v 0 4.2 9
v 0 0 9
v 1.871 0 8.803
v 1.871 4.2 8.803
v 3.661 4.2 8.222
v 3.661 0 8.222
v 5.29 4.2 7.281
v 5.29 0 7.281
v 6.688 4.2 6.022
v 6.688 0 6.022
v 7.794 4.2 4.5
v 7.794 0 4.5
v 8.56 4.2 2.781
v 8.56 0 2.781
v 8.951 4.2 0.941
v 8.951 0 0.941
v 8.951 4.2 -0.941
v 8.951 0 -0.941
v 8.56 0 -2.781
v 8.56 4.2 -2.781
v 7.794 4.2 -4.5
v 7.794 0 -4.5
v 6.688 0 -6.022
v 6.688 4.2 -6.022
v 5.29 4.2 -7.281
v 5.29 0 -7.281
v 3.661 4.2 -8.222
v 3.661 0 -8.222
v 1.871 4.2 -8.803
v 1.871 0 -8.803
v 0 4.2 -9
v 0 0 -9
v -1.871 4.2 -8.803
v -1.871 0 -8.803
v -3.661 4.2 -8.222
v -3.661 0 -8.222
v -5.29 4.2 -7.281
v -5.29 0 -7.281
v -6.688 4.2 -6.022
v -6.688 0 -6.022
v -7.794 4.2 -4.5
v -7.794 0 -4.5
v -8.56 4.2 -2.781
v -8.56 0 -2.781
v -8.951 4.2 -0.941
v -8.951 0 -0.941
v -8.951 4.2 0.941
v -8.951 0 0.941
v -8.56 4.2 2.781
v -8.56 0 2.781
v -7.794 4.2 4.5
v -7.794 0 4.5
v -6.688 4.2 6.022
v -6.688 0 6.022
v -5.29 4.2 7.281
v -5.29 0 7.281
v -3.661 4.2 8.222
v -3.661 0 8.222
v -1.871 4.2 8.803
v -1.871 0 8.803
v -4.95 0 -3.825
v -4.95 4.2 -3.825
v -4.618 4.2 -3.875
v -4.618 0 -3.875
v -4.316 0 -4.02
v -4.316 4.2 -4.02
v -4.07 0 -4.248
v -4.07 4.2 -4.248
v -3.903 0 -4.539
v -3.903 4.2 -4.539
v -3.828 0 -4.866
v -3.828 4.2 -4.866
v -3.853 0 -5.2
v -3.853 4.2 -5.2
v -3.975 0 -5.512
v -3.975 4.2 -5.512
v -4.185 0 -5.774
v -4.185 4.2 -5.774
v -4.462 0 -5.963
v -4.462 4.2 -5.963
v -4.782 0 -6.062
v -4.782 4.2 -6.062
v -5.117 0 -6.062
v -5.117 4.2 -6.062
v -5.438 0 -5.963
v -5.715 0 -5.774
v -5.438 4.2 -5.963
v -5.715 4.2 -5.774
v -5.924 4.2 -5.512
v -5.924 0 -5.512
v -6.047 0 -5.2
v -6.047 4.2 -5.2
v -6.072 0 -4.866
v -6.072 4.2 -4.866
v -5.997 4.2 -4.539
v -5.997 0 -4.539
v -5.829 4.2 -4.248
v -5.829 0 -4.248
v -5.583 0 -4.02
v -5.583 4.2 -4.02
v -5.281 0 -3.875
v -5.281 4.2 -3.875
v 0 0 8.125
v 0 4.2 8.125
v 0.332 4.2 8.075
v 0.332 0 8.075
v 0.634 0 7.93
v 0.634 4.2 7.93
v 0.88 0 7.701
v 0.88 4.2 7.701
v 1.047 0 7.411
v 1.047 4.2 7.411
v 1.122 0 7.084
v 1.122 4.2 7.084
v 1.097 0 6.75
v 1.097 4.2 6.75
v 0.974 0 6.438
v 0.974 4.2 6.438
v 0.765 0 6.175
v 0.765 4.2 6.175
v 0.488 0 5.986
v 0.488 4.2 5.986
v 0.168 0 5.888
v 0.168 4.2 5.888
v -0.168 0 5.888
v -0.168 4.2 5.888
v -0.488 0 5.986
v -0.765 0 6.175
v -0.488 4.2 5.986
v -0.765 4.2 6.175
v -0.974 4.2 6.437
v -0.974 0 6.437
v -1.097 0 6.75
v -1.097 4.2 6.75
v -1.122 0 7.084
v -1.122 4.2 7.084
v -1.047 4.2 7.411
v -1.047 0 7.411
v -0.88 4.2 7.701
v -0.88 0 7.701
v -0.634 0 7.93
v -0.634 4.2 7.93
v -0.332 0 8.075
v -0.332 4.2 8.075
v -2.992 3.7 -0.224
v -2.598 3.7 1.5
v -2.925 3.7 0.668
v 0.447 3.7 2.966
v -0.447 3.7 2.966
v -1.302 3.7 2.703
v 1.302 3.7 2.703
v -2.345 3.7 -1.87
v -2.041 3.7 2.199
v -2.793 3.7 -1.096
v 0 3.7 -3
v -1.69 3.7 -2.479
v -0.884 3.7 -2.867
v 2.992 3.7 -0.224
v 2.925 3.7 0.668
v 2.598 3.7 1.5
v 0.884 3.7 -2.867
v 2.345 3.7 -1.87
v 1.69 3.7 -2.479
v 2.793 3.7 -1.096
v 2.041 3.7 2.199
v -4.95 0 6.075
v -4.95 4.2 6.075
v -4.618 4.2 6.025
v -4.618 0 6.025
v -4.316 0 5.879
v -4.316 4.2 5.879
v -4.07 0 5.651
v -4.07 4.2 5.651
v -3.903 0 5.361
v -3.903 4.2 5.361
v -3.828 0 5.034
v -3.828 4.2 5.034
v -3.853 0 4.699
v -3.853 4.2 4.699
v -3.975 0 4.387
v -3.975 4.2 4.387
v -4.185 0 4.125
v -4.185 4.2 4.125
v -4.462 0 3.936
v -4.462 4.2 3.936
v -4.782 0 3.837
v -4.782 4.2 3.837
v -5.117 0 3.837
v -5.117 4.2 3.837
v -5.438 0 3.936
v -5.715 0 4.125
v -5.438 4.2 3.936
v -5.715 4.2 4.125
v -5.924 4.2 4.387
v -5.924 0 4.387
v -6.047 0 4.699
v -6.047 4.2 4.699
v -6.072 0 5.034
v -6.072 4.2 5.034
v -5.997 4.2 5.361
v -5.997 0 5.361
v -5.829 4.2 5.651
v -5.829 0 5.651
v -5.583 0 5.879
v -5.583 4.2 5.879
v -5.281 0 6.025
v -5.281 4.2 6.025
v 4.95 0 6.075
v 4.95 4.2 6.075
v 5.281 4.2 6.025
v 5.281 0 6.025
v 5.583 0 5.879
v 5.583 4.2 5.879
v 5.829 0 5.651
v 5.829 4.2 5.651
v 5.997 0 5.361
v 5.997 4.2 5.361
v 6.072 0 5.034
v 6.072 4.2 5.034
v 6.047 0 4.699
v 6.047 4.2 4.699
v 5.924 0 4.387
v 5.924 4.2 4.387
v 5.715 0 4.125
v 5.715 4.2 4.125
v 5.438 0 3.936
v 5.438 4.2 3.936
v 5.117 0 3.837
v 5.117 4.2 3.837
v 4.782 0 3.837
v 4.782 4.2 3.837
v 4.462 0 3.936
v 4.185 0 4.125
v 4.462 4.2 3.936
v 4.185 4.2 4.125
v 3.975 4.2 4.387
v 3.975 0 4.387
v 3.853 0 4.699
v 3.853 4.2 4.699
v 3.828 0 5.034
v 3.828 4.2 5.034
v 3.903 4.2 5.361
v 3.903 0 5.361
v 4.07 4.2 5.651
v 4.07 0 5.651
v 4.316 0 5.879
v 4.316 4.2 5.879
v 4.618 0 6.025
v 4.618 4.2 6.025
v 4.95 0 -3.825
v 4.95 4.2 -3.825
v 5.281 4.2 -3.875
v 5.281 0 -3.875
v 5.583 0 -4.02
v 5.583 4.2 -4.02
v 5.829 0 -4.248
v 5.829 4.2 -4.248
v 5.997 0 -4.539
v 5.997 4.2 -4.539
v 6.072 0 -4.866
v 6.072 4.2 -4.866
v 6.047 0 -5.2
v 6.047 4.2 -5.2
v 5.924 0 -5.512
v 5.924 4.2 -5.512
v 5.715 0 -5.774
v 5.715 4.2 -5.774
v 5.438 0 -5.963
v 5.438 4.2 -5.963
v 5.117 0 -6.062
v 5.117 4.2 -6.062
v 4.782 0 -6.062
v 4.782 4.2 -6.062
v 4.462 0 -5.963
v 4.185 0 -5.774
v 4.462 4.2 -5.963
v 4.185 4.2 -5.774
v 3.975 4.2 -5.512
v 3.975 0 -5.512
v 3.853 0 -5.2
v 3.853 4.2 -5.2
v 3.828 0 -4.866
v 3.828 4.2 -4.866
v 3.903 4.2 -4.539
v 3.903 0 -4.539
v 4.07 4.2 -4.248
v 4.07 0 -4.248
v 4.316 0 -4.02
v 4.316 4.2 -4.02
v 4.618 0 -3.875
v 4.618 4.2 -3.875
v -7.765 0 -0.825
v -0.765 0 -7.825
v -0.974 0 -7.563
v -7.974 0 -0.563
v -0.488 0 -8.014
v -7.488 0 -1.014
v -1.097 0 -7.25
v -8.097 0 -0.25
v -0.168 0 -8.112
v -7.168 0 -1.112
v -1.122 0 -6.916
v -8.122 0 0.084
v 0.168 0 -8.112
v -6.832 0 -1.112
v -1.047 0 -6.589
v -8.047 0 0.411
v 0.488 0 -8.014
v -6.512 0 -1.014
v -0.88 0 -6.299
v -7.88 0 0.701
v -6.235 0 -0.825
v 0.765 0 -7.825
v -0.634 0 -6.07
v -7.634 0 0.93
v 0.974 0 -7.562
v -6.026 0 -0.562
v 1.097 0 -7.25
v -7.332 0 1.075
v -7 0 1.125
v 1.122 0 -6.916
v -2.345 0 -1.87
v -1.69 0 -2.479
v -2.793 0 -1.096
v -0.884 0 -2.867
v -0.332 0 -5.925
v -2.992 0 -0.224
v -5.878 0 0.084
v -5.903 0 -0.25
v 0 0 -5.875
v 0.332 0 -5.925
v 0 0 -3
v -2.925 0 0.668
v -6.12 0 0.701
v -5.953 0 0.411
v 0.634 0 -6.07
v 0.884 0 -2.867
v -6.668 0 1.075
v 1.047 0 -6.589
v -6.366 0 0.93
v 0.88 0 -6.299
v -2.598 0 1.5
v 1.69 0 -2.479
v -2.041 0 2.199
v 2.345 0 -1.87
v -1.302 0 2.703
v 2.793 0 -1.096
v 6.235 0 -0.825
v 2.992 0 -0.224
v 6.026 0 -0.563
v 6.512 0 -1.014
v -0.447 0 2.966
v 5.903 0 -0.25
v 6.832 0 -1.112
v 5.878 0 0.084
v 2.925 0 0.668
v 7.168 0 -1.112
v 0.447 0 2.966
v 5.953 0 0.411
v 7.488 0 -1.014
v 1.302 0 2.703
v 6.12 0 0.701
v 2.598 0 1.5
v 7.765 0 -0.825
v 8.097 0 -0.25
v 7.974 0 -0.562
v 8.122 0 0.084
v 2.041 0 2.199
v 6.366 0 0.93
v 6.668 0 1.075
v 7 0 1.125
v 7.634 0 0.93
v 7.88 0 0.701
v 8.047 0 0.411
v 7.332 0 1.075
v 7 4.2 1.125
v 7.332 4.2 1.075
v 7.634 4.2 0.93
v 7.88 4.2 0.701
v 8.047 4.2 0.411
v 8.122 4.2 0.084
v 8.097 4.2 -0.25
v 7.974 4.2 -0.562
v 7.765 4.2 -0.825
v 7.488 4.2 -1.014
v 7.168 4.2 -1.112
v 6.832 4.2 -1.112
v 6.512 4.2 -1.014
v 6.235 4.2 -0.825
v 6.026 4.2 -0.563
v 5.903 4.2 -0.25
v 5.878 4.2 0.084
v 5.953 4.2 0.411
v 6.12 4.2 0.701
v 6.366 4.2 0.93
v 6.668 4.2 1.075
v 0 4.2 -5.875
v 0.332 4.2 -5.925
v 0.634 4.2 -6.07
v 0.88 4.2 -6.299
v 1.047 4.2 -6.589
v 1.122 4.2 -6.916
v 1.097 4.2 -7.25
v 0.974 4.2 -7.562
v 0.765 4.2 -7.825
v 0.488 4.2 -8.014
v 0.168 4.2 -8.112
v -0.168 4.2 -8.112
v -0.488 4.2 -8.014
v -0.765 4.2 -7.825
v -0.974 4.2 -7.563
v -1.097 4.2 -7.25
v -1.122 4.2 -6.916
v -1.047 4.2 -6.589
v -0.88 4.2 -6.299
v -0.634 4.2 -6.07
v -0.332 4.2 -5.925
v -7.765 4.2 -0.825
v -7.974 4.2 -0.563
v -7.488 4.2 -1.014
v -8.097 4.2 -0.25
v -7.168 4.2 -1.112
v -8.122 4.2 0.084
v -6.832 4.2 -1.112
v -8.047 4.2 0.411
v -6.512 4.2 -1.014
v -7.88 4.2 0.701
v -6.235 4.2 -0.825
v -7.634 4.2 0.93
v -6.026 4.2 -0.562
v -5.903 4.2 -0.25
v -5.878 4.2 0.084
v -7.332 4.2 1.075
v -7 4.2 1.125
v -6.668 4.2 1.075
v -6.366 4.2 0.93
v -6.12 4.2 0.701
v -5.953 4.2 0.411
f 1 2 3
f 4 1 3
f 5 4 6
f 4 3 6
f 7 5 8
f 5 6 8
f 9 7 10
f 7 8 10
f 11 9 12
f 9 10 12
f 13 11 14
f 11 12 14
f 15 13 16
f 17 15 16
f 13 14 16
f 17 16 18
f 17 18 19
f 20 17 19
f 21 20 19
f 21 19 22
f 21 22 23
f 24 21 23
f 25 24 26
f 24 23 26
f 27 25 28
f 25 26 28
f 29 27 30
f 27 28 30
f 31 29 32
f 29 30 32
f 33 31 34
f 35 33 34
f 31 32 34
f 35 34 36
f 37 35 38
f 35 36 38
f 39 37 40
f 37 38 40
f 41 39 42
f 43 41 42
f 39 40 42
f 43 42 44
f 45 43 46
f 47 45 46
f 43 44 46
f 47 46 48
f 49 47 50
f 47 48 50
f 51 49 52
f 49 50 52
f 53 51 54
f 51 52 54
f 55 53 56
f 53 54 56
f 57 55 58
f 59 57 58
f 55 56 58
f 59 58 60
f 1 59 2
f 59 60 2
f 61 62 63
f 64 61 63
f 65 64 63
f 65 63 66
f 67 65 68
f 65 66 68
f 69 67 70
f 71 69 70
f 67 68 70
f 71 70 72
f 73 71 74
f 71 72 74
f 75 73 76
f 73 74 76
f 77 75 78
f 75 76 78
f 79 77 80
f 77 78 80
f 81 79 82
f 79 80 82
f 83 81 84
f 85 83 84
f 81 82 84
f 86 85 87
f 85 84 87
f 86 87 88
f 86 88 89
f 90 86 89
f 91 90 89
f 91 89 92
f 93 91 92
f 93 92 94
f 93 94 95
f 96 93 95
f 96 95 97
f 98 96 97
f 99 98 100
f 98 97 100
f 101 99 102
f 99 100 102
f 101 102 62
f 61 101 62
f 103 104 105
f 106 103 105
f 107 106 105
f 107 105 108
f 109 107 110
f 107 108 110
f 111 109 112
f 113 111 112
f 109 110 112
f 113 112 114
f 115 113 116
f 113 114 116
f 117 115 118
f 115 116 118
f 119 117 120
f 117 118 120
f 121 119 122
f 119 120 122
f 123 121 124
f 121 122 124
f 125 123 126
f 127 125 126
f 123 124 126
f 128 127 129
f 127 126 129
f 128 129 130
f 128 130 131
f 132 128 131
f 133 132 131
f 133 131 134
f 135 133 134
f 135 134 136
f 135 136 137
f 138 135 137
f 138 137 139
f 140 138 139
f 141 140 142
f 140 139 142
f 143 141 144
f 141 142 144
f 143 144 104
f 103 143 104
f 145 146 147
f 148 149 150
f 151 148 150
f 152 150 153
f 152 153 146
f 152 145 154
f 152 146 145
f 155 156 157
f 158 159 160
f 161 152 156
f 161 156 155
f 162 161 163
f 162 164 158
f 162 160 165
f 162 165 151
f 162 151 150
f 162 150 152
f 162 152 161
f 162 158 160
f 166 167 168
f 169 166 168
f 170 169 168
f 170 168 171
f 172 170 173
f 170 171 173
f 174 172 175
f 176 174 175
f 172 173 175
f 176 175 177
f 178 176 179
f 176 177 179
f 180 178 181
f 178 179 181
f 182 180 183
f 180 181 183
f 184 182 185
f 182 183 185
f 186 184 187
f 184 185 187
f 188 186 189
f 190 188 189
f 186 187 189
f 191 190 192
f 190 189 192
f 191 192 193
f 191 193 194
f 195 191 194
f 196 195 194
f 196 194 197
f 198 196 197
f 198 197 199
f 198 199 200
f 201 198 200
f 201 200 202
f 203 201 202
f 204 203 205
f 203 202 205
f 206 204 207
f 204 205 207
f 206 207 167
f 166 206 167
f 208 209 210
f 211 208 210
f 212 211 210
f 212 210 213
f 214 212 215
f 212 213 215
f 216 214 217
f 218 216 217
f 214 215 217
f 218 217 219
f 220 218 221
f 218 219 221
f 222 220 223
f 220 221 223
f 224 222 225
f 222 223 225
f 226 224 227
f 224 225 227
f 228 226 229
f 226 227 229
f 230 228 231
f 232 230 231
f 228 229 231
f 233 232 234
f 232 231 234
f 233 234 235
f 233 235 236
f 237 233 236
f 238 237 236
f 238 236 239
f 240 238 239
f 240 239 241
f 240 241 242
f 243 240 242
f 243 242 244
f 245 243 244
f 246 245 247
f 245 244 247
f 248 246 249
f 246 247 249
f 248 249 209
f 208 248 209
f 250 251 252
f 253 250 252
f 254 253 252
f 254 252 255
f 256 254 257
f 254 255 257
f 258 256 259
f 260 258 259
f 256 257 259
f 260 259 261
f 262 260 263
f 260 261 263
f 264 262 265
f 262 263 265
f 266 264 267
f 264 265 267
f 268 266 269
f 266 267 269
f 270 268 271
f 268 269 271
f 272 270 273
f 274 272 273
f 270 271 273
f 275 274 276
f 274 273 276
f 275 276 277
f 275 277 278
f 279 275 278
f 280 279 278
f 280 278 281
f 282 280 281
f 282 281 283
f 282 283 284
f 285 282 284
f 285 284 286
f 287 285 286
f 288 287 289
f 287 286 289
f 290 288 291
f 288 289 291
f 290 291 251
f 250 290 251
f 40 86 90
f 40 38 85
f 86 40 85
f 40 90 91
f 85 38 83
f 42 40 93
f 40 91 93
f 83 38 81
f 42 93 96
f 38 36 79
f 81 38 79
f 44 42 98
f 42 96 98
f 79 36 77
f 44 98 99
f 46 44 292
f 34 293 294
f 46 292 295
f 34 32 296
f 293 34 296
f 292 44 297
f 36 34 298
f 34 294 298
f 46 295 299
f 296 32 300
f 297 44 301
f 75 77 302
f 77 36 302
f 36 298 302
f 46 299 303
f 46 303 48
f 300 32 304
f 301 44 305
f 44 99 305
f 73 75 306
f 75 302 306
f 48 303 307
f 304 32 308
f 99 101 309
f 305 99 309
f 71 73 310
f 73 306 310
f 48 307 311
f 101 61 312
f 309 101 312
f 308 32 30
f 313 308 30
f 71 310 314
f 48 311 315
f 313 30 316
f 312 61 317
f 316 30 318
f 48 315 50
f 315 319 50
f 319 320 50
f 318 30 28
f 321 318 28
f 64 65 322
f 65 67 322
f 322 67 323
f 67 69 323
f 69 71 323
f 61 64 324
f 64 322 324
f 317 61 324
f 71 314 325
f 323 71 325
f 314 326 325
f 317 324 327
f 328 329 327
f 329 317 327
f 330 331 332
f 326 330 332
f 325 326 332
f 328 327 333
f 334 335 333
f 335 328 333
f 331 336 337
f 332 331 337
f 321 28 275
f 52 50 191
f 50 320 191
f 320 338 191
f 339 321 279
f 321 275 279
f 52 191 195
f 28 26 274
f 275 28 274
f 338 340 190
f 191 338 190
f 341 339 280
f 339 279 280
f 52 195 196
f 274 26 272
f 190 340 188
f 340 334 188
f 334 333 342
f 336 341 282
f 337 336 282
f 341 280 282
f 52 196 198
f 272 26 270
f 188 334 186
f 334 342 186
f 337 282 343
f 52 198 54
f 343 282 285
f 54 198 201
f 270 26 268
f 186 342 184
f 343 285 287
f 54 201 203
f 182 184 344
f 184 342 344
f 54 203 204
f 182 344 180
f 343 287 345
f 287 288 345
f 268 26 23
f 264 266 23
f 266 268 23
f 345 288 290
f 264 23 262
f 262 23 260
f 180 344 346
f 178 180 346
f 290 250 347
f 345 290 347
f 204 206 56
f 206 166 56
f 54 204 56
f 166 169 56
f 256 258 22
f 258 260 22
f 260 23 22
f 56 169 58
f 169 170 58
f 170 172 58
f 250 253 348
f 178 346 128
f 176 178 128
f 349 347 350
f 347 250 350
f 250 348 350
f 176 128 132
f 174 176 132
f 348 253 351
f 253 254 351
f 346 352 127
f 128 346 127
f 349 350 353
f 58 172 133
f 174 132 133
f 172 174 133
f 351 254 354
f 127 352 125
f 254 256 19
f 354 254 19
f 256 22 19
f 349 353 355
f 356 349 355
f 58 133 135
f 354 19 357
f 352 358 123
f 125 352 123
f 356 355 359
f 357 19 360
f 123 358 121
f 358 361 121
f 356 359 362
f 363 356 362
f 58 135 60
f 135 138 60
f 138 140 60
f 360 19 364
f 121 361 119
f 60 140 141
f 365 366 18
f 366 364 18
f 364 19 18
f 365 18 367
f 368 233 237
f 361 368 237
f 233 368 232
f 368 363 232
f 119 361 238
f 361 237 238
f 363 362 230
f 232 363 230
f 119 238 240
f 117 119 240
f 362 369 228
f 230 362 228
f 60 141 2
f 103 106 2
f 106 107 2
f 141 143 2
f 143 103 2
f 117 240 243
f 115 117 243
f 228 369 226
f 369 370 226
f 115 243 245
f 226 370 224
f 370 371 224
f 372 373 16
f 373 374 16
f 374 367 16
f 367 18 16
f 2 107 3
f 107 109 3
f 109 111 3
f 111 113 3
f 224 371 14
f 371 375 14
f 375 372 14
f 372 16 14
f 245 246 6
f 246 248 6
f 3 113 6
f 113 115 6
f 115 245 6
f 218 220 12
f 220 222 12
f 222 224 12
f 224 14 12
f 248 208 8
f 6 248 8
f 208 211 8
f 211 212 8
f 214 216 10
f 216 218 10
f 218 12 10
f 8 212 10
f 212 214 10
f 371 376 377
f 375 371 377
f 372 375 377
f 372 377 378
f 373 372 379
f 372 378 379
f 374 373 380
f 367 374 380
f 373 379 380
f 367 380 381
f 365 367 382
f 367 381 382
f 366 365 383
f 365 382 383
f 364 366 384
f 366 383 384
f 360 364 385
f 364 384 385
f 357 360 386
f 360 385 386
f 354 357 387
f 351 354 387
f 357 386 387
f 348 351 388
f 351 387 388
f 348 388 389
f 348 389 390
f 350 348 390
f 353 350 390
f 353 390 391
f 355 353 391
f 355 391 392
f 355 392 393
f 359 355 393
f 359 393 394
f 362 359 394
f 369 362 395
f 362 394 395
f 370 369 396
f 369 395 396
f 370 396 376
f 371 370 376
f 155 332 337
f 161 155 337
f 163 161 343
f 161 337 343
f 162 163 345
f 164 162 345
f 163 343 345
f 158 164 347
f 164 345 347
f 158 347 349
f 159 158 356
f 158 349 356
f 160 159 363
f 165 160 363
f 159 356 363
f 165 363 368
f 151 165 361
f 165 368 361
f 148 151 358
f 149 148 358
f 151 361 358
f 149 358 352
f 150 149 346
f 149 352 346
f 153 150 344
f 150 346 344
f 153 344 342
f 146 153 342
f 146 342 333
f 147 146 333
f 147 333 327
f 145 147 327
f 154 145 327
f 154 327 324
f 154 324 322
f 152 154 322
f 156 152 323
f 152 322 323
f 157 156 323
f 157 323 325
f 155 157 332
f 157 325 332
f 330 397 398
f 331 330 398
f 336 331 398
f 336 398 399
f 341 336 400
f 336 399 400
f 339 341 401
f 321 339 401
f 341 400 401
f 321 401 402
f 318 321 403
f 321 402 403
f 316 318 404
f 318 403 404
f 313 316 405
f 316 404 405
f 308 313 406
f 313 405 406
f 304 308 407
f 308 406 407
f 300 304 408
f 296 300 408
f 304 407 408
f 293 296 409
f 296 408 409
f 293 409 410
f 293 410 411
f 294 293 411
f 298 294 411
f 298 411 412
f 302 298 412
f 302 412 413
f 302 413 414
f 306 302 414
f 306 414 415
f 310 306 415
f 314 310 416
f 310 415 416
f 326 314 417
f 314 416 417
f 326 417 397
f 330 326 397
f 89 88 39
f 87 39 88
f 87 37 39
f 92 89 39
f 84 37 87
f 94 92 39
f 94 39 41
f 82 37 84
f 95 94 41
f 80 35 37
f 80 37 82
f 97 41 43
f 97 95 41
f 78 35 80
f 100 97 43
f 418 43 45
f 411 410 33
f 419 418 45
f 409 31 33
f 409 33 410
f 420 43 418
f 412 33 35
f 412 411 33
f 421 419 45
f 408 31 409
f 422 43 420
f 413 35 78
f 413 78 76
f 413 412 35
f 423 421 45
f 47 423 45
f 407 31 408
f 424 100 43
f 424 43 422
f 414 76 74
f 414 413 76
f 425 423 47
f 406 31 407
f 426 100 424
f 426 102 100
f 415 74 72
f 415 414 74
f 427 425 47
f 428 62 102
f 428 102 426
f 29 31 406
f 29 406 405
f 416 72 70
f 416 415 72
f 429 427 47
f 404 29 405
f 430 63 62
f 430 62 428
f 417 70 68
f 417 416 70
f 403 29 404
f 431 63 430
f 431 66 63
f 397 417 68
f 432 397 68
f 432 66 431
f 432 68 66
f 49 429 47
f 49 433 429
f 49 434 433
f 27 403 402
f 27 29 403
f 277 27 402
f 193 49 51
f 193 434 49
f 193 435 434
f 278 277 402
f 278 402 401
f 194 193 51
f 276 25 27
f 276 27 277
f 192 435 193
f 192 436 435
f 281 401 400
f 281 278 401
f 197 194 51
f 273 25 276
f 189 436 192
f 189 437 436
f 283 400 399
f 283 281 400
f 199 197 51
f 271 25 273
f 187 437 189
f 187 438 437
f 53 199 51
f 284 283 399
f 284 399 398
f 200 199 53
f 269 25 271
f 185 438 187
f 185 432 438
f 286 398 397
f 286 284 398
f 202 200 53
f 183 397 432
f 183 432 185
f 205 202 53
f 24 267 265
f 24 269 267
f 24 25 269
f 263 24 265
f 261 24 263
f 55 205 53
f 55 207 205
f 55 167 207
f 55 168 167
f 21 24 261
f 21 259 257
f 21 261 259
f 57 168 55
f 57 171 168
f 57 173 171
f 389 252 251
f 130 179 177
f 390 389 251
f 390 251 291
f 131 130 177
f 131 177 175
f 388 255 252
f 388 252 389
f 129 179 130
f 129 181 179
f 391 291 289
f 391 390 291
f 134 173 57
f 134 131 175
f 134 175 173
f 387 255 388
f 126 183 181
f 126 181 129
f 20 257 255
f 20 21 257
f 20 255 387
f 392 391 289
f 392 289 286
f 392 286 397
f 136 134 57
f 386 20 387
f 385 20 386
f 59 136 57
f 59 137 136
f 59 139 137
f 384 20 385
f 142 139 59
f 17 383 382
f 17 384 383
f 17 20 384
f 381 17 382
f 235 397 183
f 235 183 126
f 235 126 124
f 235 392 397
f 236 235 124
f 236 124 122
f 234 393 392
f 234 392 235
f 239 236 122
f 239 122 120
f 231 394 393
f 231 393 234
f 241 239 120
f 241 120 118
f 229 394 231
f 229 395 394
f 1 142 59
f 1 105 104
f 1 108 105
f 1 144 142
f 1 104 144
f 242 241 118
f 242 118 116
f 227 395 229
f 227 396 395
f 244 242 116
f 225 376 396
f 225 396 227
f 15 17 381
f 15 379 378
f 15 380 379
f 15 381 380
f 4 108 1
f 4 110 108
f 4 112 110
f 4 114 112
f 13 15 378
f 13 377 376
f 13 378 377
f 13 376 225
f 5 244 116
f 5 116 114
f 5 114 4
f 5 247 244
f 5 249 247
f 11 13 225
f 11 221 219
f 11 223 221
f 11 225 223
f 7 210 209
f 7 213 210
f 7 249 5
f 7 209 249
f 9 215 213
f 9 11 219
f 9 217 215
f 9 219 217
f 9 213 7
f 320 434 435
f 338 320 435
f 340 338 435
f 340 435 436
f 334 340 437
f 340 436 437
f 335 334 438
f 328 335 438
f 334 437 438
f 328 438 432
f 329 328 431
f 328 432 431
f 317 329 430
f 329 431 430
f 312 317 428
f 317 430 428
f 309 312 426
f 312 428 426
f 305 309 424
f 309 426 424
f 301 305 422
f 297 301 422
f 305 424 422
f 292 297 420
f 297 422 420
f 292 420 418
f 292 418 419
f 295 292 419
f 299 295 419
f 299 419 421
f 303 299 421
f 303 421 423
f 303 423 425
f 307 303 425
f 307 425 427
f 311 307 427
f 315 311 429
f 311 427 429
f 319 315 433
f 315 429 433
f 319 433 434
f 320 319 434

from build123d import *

# Parameters (mm, degrees)
SKETCH1_R                = 9
BRACKETMOUNT_DEPTH       = 4.2
SKETCH2_R                = 1.125
BRACKET_MOUNTHOLES_DEPTH = 4.2
SKETCH3_R                = 3
AXLEHOLE_DEPTH           = 3.7


with BuildPart() as part:
    # Sketch1 → BracketMount (new body)
    with BuildSketch(Plane(origin=(0, 0, 0), x_dir=(1, 0, 0), z_dir=(0, 1, 0))):
        with Locations(Location((0, 0, 0), (0, 0, 270))):
            Circle(SKETCH1_R)
    extrude(amount=BRACKETMOUNT_DEPTH)

    # Sketch2 → Bracket-MountHoles (cut)
    with BuildSketch(Plane(origin=(0, 4.2, 0), x_dir=(1, 0, 0), z_dir=(0, 1, 0))):
        with Locations(Location((0, 7, 0), (0, 0, 270))):
            Circle(SKETCH2_R)
        with Locations(Location((4.949747468, 4.949747468, 0), (0, 0, 270))):
            Circle(SKETCH2_R)
        with Locations(Location((7, 0, 0), (0, 0, 270))):
            Circle(SKETCH2_R)
        with Locations(Location((4.949747468, -4.949747468, 0), (0, 0, 270))):
            Circle(SKETCH2_R)
        with Locations(Location((0, -7, 0), (0, 0, 270))):
            Circle(SKETCH2_R)
        with Locations(Location((-4.949747468, -4.949747468, 0), (0, 0, 270))):
            Circle(SKETCH2_R)
        with Locations(Location((-7, 0, 0), (0, 0, 270))):
            Circle(SKETCH2_R)
        with Locations(Location((-4.949747468, 4.949747468, 0), (0, 0, 270))):
            Circle(SKETCH2_R)
    extrude(amount=-BRACKET_MOUNTHOLES_DEPTH, mode=Mode.SUBTRACT)

    # Sketch3 → AxleHole (cut)
    with BuildSketch(Plane.XZ):
        with Locations(Location((0, 0, 0), (0, 0, 270))):
            Circle(SKETCH3_R)
    extrude(amount=-AXLEHOLE_DEPTH, mode=Mode.SUBTRACT)


solid = part.part
